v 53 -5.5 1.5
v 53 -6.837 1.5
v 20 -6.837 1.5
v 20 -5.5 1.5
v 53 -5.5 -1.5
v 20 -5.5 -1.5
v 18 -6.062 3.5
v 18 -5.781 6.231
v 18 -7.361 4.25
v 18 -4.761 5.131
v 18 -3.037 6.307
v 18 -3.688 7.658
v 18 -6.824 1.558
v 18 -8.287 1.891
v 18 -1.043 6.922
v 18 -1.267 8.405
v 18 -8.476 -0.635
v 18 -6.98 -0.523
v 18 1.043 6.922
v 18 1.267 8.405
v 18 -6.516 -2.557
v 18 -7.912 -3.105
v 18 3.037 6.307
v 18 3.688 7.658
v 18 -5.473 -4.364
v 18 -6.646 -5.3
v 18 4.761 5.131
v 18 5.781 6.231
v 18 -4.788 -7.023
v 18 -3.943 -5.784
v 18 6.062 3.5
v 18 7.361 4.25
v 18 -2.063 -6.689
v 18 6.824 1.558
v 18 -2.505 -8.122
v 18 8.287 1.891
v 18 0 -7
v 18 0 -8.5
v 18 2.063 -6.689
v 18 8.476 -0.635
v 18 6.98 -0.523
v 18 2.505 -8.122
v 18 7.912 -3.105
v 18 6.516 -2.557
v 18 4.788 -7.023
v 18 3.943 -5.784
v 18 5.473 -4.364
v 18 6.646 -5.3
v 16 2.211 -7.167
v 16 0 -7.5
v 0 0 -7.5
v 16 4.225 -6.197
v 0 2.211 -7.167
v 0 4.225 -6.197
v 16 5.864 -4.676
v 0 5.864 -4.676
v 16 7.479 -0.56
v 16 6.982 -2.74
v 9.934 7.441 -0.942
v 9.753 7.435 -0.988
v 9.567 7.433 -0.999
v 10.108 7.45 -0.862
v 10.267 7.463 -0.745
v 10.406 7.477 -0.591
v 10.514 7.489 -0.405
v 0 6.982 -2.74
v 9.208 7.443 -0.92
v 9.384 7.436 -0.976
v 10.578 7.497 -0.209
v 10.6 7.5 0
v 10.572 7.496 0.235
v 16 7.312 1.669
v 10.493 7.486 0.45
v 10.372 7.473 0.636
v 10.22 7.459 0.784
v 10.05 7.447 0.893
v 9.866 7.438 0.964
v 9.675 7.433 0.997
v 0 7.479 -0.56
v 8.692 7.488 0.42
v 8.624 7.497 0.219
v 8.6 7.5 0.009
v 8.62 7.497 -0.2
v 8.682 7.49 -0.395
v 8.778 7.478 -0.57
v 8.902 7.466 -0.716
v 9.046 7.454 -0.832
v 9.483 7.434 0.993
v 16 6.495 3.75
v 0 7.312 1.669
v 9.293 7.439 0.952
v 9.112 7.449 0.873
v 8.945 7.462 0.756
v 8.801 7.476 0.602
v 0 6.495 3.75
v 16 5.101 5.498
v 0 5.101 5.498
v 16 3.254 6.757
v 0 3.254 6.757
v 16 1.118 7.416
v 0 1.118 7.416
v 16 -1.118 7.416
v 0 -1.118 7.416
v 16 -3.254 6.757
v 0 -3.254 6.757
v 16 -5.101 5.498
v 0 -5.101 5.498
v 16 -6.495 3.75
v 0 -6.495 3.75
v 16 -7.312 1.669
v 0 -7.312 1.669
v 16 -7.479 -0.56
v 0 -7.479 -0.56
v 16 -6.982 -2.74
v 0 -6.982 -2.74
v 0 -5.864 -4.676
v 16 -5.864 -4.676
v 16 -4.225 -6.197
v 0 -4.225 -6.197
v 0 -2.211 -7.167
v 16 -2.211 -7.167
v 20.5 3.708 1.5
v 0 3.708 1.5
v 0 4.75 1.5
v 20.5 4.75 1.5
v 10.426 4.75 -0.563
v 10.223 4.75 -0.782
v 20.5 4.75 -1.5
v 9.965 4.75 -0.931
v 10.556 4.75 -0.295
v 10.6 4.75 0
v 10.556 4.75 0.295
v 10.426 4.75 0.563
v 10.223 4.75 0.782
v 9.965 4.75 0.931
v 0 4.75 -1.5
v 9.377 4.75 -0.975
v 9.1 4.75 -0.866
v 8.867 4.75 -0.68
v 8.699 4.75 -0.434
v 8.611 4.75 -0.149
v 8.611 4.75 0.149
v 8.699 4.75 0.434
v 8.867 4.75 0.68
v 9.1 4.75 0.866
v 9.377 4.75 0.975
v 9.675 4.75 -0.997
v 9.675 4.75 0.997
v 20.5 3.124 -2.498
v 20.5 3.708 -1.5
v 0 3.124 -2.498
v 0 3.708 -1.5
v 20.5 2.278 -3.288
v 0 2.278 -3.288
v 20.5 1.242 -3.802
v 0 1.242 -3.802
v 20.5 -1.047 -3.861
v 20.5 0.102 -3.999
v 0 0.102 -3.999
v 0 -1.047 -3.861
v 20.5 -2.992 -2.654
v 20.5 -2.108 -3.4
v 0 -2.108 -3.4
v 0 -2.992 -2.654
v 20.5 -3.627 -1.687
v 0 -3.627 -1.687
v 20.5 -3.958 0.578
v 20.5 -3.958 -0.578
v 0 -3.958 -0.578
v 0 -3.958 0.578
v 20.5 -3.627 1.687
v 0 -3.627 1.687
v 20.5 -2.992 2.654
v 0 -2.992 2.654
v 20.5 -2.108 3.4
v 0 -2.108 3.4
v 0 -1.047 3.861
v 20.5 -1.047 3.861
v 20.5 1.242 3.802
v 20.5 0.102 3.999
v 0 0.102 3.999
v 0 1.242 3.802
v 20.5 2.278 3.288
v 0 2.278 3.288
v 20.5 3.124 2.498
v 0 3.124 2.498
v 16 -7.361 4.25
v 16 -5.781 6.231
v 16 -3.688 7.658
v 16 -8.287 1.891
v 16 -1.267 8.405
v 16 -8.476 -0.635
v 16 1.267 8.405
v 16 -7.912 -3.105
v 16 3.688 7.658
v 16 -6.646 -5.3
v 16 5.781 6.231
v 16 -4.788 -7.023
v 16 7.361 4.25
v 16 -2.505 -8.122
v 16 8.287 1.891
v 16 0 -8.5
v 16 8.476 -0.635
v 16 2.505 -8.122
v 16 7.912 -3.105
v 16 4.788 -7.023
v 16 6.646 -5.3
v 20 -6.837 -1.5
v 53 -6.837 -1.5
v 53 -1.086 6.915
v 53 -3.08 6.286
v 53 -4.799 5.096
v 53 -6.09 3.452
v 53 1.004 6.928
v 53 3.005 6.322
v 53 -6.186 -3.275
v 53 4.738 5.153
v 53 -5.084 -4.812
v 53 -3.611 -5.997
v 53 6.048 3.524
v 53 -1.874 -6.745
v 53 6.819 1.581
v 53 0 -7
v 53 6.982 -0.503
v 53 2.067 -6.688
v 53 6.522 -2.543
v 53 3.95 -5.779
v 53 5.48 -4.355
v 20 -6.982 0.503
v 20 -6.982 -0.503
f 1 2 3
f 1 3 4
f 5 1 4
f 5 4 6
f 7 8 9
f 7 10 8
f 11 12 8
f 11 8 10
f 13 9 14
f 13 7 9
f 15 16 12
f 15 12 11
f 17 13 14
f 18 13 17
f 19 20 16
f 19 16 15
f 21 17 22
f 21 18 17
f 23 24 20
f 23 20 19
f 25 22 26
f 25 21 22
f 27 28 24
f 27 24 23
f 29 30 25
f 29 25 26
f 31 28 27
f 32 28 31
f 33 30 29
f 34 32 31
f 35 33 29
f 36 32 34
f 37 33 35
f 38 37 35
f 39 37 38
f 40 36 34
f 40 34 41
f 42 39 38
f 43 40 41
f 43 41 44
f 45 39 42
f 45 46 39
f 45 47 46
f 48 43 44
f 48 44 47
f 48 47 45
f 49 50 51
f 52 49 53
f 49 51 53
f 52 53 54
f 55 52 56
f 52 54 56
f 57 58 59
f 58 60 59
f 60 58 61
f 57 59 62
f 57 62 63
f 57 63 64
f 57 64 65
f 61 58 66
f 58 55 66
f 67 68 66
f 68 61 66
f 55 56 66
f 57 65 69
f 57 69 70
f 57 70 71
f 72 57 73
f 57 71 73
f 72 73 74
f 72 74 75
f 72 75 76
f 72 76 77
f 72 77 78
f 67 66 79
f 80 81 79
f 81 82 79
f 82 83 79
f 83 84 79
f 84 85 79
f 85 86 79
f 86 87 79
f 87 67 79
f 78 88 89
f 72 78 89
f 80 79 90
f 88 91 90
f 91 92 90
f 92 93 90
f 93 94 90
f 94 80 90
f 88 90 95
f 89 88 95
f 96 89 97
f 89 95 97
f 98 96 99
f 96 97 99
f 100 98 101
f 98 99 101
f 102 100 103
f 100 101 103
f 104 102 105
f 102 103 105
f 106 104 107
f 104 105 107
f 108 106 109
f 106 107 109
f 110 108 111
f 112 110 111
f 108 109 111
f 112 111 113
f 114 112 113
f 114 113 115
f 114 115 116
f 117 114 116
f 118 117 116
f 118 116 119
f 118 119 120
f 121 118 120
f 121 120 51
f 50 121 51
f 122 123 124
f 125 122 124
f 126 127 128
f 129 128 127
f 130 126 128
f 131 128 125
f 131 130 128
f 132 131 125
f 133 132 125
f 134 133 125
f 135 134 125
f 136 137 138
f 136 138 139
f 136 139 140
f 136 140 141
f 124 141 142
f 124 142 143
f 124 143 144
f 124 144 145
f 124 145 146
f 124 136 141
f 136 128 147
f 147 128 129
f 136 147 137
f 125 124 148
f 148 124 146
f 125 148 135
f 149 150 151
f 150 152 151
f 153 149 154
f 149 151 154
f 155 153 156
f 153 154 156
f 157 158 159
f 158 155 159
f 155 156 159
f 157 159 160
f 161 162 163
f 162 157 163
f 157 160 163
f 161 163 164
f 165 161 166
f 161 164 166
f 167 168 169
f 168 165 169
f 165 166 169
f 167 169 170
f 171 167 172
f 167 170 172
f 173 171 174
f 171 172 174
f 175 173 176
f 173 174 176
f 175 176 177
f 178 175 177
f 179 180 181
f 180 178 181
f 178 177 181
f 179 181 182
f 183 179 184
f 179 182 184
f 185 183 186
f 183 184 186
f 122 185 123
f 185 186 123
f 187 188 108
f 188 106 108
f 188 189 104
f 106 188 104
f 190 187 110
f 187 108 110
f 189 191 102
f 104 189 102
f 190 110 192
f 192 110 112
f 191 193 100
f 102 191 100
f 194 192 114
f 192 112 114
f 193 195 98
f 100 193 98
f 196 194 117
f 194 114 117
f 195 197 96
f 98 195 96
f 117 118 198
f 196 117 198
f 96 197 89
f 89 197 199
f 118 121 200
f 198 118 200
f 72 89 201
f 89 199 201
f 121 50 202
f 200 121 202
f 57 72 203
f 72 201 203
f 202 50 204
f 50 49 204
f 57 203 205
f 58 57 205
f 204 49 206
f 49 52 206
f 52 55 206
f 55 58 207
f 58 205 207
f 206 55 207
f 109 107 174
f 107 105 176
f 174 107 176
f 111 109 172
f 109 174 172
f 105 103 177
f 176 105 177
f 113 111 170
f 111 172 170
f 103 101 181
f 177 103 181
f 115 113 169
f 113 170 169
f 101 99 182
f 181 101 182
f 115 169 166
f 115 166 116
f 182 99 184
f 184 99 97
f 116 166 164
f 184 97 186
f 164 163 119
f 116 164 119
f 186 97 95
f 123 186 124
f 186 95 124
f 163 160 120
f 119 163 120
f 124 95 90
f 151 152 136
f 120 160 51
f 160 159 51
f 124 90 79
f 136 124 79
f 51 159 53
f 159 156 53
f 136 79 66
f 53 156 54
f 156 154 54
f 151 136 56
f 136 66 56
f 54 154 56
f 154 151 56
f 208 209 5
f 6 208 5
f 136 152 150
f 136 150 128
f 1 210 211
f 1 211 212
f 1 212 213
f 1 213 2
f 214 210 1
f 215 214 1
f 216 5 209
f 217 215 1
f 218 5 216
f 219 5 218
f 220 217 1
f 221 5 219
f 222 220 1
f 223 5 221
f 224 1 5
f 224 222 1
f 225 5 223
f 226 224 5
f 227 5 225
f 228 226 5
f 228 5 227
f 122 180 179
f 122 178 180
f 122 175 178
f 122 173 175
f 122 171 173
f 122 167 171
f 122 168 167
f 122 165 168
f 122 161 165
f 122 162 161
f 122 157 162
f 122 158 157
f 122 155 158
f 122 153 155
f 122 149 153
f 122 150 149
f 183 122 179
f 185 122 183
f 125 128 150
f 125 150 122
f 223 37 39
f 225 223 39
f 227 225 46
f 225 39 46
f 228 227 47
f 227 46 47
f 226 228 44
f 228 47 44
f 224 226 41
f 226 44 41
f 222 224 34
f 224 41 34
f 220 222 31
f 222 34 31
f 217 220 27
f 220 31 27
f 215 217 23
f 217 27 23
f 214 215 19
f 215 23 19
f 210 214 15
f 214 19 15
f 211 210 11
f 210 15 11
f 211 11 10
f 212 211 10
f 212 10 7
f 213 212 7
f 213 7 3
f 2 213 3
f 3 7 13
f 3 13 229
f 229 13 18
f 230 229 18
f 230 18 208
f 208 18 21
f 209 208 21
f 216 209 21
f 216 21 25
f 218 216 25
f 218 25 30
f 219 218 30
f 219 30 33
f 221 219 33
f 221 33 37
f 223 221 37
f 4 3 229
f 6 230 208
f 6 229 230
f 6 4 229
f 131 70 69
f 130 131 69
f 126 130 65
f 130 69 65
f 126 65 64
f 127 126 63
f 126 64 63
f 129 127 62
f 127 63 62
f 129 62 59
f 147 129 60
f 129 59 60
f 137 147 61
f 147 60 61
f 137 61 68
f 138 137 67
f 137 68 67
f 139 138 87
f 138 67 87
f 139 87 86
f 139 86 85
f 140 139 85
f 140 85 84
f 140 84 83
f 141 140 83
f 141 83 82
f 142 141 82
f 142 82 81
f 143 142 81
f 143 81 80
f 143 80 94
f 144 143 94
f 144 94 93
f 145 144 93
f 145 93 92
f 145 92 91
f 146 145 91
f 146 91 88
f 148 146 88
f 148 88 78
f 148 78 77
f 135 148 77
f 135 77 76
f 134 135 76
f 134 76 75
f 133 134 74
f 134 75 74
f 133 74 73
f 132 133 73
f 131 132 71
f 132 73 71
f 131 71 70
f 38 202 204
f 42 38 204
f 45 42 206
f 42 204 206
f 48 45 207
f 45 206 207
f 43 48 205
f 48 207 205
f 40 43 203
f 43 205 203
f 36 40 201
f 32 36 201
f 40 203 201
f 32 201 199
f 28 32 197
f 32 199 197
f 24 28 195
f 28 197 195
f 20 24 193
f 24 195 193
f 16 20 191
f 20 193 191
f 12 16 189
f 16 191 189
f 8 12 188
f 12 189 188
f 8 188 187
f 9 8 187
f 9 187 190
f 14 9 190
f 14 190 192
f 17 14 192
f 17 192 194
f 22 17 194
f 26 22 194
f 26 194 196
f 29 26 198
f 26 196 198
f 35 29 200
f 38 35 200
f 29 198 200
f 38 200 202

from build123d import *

# Parameters (mm, degrees)
SKETCH1_R           = 7.5
BOSS_EXTRUDE1_DEPTH = 16
SKETCH2_R           = 8.5
BOSS_EXTRUDE2_DEPTH = 2
SKETCH3_R           = 7
BOSS_EXTRUDE3_DEPTH = 35
SKETCH4_R           = 4
CUT_EXTRUDE1_DEPTH  = 20.5
SKETCH6_W           = 3
SKETCH6_H           = 1.5
CUT_EXTRUDE2_DEPTH  = 20.5
CUT_EXTRUDE3_REACH  = 18
SKETCH7_R           = 1
SKETCH8_W           = 3
SKETCH8_H           = 3
CUT_EXTRUDE5_DEPTH  = 33


with BuildPart() as part:
    # Sketch1 → Boss-Extrude1 (new body)
    with BuildSketch(Plane(origin=(0, 0, 0), x_dir=(0, 0, -1), z_dir=(1, 0, 0))):
        Circle(SKETCH1_R)
    extrude(amount=BOSS_EXTRUDE1_DEPTH)

    # Sketch2 → Boss-Extrude2 (add)
    with BuildSketch(Plane(origin=(16, 0, 0), x_dir=(0, 0, -1), z_dir=(1, 0, 0))):
        Circle(SKETCH2_R)
    extrude(amount=BOSS_EXTRUDE2_DEPTH)

    # Sketch3 → Boss-Extrude3 (add)
    with BuildSketch(Plane(origin=(18, 0, 0), x_dir=(0, 0, -1), z_dir=(1, 0, 0))):
        Circle(SKETCH3_R)
    extrude(amount=BOSS_EXTRUDE3_DEPTH)

    # Sketch4 → Cut-Extrude1 (cut)
    with BuildSketch(Plane.ZY):
        Circle(SKETCH4_R)
    extrude(amount=-CUT_EXTRUDE1_DEPTH, mode=Mode.SUBTRACT)

    # Sketch6 → Cut-Extrude2 (cut)
    with BuildSketch(Plane.ZY):
        with Locations((0, 4)):
            Rectangle(SKETCH6_W, SKETCH6_H)
    extrude(amount=-CUT_EXTRUDE2_DEPTH, mode=Mode.SUBTRACT)

    # Sketch7 → Cut-Extrude3 (cut, up to next)
    with BuildSketch(Plane(origin=(0, 7.5, 0), x_dir=(1, 0, 0), z_dir=(0, 1, 0)), mode=Mode.PRIVATE) as cut_extrude3_sk1:
        with Locations((9.6, 0)):
            Circle(SKETCH7_R)
    cut_extrude3_tool1 = extrude(cut_extrude3_sk1.sketch, amount=-CUT_EXTRUDE3_REACH, mode=Mode.PRIVATE) & part.part
    add(cut_extrude3_tool1.solids().sort_by_distance((9.6, 7.5, 0))[0], mode=Mode.SUBTRACT)

    # Sketch8 → Cut-Extrude5 (cut)
    with BuildSketch(Plane(origin=(53, 0, 0), x_dir=(0, 0, -1), z_dir=(1, 0, 0))):
        with Locations((0, -7)):
            Rectangle(SKETCH8_W, SKETCH8_H)
    extrude(amount=-CUT_EXTRUDE5_DEPTH, mode=Mode.SUBTRACT)


solid = part.part
